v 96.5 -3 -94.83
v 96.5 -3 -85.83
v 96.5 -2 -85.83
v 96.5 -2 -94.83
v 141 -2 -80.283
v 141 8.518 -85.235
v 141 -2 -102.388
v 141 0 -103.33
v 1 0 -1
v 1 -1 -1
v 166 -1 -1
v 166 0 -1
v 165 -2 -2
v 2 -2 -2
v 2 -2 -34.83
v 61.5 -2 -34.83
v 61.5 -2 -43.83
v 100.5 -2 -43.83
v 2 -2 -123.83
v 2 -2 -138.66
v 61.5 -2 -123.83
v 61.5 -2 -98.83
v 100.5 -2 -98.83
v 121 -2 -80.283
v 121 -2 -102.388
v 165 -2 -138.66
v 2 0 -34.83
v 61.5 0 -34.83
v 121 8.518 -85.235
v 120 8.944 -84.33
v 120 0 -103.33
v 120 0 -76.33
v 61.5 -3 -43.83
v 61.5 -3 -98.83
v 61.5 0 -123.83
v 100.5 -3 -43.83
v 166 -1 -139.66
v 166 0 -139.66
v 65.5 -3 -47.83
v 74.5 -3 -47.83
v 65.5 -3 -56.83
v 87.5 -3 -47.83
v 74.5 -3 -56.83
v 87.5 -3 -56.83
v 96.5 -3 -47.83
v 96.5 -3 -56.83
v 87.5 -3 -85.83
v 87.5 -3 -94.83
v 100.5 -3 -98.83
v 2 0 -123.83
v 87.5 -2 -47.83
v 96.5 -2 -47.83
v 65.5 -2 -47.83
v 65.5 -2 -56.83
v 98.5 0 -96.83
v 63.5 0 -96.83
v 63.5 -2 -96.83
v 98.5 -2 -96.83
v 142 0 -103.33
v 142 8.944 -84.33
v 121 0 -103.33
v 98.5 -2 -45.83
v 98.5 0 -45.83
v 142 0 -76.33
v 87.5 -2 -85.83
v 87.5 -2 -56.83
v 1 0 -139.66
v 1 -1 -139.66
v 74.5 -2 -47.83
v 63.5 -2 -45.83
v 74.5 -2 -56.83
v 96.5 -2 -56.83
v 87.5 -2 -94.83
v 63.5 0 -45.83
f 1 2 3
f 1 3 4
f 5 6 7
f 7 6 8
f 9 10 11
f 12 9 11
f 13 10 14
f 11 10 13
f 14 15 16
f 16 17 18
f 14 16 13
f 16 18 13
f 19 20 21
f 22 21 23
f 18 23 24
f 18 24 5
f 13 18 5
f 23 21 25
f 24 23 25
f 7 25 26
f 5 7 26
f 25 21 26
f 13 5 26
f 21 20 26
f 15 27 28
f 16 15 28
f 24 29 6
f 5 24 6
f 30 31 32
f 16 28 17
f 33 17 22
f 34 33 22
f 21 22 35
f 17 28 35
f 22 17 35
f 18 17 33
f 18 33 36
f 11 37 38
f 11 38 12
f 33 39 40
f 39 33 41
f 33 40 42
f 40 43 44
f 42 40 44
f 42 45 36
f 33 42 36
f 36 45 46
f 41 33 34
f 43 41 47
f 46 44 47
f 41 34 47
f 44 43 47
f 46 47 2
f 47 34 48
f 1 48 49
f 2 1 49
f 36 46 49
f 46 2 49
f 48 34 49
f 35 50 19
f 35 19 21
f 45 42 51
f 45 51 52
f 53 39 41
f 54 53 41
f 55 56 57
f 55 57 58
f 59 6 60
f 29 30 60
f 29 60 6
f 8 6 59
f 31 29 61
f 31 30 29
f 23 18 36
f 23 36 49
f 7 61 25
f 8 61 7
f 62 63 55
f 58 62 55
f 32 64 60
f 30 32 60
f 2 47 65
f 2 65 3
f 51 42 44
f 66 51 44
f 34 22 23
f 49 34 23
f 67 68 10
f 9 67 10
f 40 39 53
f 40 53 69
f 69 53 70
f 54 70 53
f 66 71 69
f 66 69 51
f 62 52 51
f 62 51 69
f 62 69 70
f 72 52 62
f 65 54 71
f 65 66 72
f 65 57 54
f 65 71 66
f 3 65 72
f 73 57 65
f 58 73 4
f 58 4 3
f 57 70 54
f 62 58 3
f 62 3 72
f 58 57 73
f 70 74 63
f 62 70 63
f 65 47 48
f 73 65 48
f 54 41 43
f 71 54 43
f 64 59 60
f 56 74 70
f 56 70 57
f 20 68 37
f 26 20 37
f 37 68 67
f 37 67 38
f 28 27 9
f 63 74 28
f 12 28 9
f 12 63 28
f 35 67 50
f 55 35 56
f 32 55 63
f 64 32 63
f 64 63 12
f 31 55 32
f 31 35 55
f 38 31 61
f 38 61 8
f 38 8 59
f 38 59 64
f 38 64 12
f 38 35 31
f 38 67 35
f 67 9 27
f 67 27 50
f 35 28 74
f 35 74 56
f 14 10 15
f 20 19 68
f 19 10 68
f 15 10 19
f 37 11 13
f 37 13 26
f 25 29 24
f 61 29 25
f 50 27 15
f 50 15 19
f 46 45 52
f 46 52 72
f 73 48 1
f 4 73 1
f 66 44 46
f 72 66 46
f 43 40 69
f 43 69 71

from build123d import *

# Parameters (mm, degrees)
SKETCH1_W               = 167
SKETCH1_H               = 140.66
BOSS_EXTRUDE1_DEPTH     = 2
BOSS_EXTRUDE1_DRAFT     = -45
CUT_EXTRUDE1_REACH      = 220.353
SKETCH2_W               = 167
SKETCH2_H               = 140.66
SKETCH2_W_2             = 165
SKETCH2_H_2             = 138.66
BOSS_EXTRUDE2_START     = 120
BOSS_EXTRUDE2_DEPTH     = 22
CUT_EXTRUDE2_REACH      = 211.584
SKETCH4_W               = 20
SKETCH4_H               = 20
CUT_EXTRUDE3_DEPTH      = 218.119588246
CUT_EXTRUDE3_DEPTH_BACK = 218.119588246
SKETCH5_W               = 9
SKETCH5_H               = 9
CUT_EXTRUDE4_REACH      = 219.12
SKETCH6_W               = 59.5
SKETCH6_H               = 89
SKETCH7_W               = 35
SKETCH7_H               = 51
CUT_EXTRUDE5_DEPTH      = 2
BOSS_EXTRUDE4_START     = -2
SKETCH11_W              = 39
SKETCH11_H              = 55
BOSS_EXTRUDE4_DEPTH     = 1
CUT_EXTRUDE6_DEPTH      = 218.119588246
CUT_EXTRUDE6_DEPTH_BACK = 218.119588246
SKETCH12_W              = 9
SKETCH12_H              = 9


with BuildPart() as part:
    # Sketch1 → Boss-Extrude1 (with draft: the straight prism first)
    with BuildSketch(Plane(origin=(0, 0, 0), x_dir=(1, 0, 0), z_dir=(0, 1, 0))):
        with Locations((83.5, 70.33)):
            Rectangle(SKETCH1_W, SKETCH1_H)
    extrude(amount=-BOSS_EXTRUDE1_DEPTH)
    # Boss-Extrude1: the draft: its side faces are tilted about the plane it starts from
    boss_extrude1_sides = [part.faces().sort_by_distance(p)[0] for p in [
        (83.5, -1, 0),
        (167, -1, -70.33),
        (83.5, -1, -140.66),
        (0, -1, -70.33),
    ]]
    draft(boss_extrude1_sides, Plane(origin=(0, 0, 0), x_dir=(1, 0, 0), z_dir=(0, 1, 0)), BOSS_EXTRUDE1_DRAFT)

    # Sketch2 → Cut-Extrude1 (cut, up to next)
    with BuildSketch(Plane.XZ.offset(2), mode=Mode.PRIVATE) as cut_extrude1_sk1:
        with Locations((83.5, -70.33)):
            Rectangle(SKETCH2_W, SKETCH2_H)
        with Locations((83.5, -70.33)):
            Rectangle(SKETCH2_W_2, SKETCH2_H_2, mode=Mode.SUBTRACT)
    cut_extrude1_tool1 = extrude(cut_extrude1_sk1.sketch, amount=-CUT_EXTRUDE1_REACH, mode=Mode.PRIVATE) & part.part
    add(cut_extrude1_tool1.solids().sort_by_distance((83.5, -2, -140.441656))[0], mode=Mode.SUBTRACT)

    # Sketch3 → Boss-Extrude2 (add)
    with BuildSketch(Plane(origin=(0, 0, 0), x_dir=(0, 0, -1), z_dir=(1, 0, 0)).offset(BOSS_EXTRUDE2_START)):
        Polygon((76.33, 0), (84.33, 8.94427191), (103.33, 0), align=None)
    extrude(amount=BOSS_EXTRUDE2_DEPTH)

    # Cut-Extrude2: up to this plane
    cut_extrude2_end = Plane(origin=(0, -2, 0), z_dir=(0, -1, 0))
    # Sketch4 → Cut-Extrude2 (cut, up to the surface)
    with BuildSketch(Plane(origin=(0, 39.818641072, -18.744671202), x_dir=(1, 0, 0), z_dir=(0, 0.9047619047619048, -0.42591770999996015)), mode=Mode.PRIVATE) as cut_extrude2_sk1:
        with Locations((131, 83.489047619)):
            Rectangle(SKETCH4_W, SKETCH4_H)
    cut_extrude2_tool1 = split(extrude(cut_extrude2_sk1.sketch, amount=-CUT_EXTRUDE2_REACH, mode=Mode.PRIVATE), bisect_by=cut_extrude2_end, keep=Keep.BOTH, mode=Mode.PRIVATE)
    add(cut_extrude2_tool1.solids().sort_by_distance((131, 4.259177, -94.282381))[0], mode=Mode.SUBTRACT)

    # Sketch5 → Cut-Extrude3 (cut, two sides: drawn at the far end of the back side and taken through both)
    with BuildSketch(Plane(origin=(0, 0, 0), x_dir=(1, 0, 0), z_dir=(0, 1, 0)).offset(-CUT_EXTRUDE3_DEPTH_BACK)):
        with Locations((92, 90.33)):
            Rectangle(SKETCH5_W, SKETCH5_H)
        with Locations((92, 52.33)):
            Rectangle(SKETCH5_W, SKETCH5_H)
        with Locations((70, 52.33)):
            Rectangle(SKETCH5_W, SKETCH5_H)
    extrude(amount=CUT_EXTRUDE3_DEPTH + CUT_EXTRUDE3_DEPTH_BACK, mode=Mode.SUBTRACT)

    # Sketch6 → Cut-Extrude4 (cut, up to next)
    with BuildSketch(Plane(origin=(0, 0, 0), x_dir=(1, 0, 0), z_dir=(0, 1, 0)), mode=Mode.PRIVATE) as cut_extrude4_sk1:
        with Locations((31.75, 79.33)):
            Rectangle(SKETCH6_W, SKETCH6_H)
    cut_extrude4_tool1 = extrude(cut_extrude4_sk1.sketch, amount=-CUT_EXTRUDE4_REACH, mode=Mode.PRIVATE) & part.part
    add(cut_extrude4_tool1.solids().sort_by_distance((31.75, 0, -79.33))[0], mode=Mode.SUBTRACT)

    # Sketch7 → Cut-Extrude5 (cut)
    with BuildSketch(Plane(origin=(0, 0, 0), x_dir=(1, 0, 0), z_dir=(0, 1, 0))):
        with Locations((81, 71.33)):
            Rectangle(SKETCH7_W, SKETCH7_H)
    extrude(amount=-CUT_EXTRUDE5_DEPTH, mode=Mode.SUBTRACT)

    # Sketch11 → Boss-Extrude4 (add)
    with BuildSketch(Plane(origin=(0, 0, 0), x_dir=(1, 0, 0), z_dir=(0, 1, 0)).offset(BOSS_EXTRUDE4_START)):
        with Locations((81, 71.33)):
            Rectangle(SKETCH11_W, SKETCH11_H)
    extrude(amount=-BOSS_EXTRUDE4_DEPTH)

    # Sketch12 → Cut-Extrude6 (cut, two sides: drawn at the far end of the back side and taken through both)
    with BuildSketch(Plane(origin=(0, 0, 0), x_dir=(1, 0, 0), z_dir=(0, 1, 0)).offset(-CUT_EXTRUDE6_DEPTH_BACK)):
        with Locations((92, 52.33)):
            Rectangle(SKETCH12_W, SKETCH12_H)
        with Locations((70, 52.33)):
            Rectangle(SKETCH12_W, SKETCH12_H)
        with Locations((92, 90.33)):
            Rectangle(SKETCH12_W, SKETCH12_H)
    extrude(amount=CUT_EXTRUDE6_DEPTH + CUT_EXTRUDE6_DEPTH_BACK, mode=Mode.SUBTRACT)


solid = part.part
